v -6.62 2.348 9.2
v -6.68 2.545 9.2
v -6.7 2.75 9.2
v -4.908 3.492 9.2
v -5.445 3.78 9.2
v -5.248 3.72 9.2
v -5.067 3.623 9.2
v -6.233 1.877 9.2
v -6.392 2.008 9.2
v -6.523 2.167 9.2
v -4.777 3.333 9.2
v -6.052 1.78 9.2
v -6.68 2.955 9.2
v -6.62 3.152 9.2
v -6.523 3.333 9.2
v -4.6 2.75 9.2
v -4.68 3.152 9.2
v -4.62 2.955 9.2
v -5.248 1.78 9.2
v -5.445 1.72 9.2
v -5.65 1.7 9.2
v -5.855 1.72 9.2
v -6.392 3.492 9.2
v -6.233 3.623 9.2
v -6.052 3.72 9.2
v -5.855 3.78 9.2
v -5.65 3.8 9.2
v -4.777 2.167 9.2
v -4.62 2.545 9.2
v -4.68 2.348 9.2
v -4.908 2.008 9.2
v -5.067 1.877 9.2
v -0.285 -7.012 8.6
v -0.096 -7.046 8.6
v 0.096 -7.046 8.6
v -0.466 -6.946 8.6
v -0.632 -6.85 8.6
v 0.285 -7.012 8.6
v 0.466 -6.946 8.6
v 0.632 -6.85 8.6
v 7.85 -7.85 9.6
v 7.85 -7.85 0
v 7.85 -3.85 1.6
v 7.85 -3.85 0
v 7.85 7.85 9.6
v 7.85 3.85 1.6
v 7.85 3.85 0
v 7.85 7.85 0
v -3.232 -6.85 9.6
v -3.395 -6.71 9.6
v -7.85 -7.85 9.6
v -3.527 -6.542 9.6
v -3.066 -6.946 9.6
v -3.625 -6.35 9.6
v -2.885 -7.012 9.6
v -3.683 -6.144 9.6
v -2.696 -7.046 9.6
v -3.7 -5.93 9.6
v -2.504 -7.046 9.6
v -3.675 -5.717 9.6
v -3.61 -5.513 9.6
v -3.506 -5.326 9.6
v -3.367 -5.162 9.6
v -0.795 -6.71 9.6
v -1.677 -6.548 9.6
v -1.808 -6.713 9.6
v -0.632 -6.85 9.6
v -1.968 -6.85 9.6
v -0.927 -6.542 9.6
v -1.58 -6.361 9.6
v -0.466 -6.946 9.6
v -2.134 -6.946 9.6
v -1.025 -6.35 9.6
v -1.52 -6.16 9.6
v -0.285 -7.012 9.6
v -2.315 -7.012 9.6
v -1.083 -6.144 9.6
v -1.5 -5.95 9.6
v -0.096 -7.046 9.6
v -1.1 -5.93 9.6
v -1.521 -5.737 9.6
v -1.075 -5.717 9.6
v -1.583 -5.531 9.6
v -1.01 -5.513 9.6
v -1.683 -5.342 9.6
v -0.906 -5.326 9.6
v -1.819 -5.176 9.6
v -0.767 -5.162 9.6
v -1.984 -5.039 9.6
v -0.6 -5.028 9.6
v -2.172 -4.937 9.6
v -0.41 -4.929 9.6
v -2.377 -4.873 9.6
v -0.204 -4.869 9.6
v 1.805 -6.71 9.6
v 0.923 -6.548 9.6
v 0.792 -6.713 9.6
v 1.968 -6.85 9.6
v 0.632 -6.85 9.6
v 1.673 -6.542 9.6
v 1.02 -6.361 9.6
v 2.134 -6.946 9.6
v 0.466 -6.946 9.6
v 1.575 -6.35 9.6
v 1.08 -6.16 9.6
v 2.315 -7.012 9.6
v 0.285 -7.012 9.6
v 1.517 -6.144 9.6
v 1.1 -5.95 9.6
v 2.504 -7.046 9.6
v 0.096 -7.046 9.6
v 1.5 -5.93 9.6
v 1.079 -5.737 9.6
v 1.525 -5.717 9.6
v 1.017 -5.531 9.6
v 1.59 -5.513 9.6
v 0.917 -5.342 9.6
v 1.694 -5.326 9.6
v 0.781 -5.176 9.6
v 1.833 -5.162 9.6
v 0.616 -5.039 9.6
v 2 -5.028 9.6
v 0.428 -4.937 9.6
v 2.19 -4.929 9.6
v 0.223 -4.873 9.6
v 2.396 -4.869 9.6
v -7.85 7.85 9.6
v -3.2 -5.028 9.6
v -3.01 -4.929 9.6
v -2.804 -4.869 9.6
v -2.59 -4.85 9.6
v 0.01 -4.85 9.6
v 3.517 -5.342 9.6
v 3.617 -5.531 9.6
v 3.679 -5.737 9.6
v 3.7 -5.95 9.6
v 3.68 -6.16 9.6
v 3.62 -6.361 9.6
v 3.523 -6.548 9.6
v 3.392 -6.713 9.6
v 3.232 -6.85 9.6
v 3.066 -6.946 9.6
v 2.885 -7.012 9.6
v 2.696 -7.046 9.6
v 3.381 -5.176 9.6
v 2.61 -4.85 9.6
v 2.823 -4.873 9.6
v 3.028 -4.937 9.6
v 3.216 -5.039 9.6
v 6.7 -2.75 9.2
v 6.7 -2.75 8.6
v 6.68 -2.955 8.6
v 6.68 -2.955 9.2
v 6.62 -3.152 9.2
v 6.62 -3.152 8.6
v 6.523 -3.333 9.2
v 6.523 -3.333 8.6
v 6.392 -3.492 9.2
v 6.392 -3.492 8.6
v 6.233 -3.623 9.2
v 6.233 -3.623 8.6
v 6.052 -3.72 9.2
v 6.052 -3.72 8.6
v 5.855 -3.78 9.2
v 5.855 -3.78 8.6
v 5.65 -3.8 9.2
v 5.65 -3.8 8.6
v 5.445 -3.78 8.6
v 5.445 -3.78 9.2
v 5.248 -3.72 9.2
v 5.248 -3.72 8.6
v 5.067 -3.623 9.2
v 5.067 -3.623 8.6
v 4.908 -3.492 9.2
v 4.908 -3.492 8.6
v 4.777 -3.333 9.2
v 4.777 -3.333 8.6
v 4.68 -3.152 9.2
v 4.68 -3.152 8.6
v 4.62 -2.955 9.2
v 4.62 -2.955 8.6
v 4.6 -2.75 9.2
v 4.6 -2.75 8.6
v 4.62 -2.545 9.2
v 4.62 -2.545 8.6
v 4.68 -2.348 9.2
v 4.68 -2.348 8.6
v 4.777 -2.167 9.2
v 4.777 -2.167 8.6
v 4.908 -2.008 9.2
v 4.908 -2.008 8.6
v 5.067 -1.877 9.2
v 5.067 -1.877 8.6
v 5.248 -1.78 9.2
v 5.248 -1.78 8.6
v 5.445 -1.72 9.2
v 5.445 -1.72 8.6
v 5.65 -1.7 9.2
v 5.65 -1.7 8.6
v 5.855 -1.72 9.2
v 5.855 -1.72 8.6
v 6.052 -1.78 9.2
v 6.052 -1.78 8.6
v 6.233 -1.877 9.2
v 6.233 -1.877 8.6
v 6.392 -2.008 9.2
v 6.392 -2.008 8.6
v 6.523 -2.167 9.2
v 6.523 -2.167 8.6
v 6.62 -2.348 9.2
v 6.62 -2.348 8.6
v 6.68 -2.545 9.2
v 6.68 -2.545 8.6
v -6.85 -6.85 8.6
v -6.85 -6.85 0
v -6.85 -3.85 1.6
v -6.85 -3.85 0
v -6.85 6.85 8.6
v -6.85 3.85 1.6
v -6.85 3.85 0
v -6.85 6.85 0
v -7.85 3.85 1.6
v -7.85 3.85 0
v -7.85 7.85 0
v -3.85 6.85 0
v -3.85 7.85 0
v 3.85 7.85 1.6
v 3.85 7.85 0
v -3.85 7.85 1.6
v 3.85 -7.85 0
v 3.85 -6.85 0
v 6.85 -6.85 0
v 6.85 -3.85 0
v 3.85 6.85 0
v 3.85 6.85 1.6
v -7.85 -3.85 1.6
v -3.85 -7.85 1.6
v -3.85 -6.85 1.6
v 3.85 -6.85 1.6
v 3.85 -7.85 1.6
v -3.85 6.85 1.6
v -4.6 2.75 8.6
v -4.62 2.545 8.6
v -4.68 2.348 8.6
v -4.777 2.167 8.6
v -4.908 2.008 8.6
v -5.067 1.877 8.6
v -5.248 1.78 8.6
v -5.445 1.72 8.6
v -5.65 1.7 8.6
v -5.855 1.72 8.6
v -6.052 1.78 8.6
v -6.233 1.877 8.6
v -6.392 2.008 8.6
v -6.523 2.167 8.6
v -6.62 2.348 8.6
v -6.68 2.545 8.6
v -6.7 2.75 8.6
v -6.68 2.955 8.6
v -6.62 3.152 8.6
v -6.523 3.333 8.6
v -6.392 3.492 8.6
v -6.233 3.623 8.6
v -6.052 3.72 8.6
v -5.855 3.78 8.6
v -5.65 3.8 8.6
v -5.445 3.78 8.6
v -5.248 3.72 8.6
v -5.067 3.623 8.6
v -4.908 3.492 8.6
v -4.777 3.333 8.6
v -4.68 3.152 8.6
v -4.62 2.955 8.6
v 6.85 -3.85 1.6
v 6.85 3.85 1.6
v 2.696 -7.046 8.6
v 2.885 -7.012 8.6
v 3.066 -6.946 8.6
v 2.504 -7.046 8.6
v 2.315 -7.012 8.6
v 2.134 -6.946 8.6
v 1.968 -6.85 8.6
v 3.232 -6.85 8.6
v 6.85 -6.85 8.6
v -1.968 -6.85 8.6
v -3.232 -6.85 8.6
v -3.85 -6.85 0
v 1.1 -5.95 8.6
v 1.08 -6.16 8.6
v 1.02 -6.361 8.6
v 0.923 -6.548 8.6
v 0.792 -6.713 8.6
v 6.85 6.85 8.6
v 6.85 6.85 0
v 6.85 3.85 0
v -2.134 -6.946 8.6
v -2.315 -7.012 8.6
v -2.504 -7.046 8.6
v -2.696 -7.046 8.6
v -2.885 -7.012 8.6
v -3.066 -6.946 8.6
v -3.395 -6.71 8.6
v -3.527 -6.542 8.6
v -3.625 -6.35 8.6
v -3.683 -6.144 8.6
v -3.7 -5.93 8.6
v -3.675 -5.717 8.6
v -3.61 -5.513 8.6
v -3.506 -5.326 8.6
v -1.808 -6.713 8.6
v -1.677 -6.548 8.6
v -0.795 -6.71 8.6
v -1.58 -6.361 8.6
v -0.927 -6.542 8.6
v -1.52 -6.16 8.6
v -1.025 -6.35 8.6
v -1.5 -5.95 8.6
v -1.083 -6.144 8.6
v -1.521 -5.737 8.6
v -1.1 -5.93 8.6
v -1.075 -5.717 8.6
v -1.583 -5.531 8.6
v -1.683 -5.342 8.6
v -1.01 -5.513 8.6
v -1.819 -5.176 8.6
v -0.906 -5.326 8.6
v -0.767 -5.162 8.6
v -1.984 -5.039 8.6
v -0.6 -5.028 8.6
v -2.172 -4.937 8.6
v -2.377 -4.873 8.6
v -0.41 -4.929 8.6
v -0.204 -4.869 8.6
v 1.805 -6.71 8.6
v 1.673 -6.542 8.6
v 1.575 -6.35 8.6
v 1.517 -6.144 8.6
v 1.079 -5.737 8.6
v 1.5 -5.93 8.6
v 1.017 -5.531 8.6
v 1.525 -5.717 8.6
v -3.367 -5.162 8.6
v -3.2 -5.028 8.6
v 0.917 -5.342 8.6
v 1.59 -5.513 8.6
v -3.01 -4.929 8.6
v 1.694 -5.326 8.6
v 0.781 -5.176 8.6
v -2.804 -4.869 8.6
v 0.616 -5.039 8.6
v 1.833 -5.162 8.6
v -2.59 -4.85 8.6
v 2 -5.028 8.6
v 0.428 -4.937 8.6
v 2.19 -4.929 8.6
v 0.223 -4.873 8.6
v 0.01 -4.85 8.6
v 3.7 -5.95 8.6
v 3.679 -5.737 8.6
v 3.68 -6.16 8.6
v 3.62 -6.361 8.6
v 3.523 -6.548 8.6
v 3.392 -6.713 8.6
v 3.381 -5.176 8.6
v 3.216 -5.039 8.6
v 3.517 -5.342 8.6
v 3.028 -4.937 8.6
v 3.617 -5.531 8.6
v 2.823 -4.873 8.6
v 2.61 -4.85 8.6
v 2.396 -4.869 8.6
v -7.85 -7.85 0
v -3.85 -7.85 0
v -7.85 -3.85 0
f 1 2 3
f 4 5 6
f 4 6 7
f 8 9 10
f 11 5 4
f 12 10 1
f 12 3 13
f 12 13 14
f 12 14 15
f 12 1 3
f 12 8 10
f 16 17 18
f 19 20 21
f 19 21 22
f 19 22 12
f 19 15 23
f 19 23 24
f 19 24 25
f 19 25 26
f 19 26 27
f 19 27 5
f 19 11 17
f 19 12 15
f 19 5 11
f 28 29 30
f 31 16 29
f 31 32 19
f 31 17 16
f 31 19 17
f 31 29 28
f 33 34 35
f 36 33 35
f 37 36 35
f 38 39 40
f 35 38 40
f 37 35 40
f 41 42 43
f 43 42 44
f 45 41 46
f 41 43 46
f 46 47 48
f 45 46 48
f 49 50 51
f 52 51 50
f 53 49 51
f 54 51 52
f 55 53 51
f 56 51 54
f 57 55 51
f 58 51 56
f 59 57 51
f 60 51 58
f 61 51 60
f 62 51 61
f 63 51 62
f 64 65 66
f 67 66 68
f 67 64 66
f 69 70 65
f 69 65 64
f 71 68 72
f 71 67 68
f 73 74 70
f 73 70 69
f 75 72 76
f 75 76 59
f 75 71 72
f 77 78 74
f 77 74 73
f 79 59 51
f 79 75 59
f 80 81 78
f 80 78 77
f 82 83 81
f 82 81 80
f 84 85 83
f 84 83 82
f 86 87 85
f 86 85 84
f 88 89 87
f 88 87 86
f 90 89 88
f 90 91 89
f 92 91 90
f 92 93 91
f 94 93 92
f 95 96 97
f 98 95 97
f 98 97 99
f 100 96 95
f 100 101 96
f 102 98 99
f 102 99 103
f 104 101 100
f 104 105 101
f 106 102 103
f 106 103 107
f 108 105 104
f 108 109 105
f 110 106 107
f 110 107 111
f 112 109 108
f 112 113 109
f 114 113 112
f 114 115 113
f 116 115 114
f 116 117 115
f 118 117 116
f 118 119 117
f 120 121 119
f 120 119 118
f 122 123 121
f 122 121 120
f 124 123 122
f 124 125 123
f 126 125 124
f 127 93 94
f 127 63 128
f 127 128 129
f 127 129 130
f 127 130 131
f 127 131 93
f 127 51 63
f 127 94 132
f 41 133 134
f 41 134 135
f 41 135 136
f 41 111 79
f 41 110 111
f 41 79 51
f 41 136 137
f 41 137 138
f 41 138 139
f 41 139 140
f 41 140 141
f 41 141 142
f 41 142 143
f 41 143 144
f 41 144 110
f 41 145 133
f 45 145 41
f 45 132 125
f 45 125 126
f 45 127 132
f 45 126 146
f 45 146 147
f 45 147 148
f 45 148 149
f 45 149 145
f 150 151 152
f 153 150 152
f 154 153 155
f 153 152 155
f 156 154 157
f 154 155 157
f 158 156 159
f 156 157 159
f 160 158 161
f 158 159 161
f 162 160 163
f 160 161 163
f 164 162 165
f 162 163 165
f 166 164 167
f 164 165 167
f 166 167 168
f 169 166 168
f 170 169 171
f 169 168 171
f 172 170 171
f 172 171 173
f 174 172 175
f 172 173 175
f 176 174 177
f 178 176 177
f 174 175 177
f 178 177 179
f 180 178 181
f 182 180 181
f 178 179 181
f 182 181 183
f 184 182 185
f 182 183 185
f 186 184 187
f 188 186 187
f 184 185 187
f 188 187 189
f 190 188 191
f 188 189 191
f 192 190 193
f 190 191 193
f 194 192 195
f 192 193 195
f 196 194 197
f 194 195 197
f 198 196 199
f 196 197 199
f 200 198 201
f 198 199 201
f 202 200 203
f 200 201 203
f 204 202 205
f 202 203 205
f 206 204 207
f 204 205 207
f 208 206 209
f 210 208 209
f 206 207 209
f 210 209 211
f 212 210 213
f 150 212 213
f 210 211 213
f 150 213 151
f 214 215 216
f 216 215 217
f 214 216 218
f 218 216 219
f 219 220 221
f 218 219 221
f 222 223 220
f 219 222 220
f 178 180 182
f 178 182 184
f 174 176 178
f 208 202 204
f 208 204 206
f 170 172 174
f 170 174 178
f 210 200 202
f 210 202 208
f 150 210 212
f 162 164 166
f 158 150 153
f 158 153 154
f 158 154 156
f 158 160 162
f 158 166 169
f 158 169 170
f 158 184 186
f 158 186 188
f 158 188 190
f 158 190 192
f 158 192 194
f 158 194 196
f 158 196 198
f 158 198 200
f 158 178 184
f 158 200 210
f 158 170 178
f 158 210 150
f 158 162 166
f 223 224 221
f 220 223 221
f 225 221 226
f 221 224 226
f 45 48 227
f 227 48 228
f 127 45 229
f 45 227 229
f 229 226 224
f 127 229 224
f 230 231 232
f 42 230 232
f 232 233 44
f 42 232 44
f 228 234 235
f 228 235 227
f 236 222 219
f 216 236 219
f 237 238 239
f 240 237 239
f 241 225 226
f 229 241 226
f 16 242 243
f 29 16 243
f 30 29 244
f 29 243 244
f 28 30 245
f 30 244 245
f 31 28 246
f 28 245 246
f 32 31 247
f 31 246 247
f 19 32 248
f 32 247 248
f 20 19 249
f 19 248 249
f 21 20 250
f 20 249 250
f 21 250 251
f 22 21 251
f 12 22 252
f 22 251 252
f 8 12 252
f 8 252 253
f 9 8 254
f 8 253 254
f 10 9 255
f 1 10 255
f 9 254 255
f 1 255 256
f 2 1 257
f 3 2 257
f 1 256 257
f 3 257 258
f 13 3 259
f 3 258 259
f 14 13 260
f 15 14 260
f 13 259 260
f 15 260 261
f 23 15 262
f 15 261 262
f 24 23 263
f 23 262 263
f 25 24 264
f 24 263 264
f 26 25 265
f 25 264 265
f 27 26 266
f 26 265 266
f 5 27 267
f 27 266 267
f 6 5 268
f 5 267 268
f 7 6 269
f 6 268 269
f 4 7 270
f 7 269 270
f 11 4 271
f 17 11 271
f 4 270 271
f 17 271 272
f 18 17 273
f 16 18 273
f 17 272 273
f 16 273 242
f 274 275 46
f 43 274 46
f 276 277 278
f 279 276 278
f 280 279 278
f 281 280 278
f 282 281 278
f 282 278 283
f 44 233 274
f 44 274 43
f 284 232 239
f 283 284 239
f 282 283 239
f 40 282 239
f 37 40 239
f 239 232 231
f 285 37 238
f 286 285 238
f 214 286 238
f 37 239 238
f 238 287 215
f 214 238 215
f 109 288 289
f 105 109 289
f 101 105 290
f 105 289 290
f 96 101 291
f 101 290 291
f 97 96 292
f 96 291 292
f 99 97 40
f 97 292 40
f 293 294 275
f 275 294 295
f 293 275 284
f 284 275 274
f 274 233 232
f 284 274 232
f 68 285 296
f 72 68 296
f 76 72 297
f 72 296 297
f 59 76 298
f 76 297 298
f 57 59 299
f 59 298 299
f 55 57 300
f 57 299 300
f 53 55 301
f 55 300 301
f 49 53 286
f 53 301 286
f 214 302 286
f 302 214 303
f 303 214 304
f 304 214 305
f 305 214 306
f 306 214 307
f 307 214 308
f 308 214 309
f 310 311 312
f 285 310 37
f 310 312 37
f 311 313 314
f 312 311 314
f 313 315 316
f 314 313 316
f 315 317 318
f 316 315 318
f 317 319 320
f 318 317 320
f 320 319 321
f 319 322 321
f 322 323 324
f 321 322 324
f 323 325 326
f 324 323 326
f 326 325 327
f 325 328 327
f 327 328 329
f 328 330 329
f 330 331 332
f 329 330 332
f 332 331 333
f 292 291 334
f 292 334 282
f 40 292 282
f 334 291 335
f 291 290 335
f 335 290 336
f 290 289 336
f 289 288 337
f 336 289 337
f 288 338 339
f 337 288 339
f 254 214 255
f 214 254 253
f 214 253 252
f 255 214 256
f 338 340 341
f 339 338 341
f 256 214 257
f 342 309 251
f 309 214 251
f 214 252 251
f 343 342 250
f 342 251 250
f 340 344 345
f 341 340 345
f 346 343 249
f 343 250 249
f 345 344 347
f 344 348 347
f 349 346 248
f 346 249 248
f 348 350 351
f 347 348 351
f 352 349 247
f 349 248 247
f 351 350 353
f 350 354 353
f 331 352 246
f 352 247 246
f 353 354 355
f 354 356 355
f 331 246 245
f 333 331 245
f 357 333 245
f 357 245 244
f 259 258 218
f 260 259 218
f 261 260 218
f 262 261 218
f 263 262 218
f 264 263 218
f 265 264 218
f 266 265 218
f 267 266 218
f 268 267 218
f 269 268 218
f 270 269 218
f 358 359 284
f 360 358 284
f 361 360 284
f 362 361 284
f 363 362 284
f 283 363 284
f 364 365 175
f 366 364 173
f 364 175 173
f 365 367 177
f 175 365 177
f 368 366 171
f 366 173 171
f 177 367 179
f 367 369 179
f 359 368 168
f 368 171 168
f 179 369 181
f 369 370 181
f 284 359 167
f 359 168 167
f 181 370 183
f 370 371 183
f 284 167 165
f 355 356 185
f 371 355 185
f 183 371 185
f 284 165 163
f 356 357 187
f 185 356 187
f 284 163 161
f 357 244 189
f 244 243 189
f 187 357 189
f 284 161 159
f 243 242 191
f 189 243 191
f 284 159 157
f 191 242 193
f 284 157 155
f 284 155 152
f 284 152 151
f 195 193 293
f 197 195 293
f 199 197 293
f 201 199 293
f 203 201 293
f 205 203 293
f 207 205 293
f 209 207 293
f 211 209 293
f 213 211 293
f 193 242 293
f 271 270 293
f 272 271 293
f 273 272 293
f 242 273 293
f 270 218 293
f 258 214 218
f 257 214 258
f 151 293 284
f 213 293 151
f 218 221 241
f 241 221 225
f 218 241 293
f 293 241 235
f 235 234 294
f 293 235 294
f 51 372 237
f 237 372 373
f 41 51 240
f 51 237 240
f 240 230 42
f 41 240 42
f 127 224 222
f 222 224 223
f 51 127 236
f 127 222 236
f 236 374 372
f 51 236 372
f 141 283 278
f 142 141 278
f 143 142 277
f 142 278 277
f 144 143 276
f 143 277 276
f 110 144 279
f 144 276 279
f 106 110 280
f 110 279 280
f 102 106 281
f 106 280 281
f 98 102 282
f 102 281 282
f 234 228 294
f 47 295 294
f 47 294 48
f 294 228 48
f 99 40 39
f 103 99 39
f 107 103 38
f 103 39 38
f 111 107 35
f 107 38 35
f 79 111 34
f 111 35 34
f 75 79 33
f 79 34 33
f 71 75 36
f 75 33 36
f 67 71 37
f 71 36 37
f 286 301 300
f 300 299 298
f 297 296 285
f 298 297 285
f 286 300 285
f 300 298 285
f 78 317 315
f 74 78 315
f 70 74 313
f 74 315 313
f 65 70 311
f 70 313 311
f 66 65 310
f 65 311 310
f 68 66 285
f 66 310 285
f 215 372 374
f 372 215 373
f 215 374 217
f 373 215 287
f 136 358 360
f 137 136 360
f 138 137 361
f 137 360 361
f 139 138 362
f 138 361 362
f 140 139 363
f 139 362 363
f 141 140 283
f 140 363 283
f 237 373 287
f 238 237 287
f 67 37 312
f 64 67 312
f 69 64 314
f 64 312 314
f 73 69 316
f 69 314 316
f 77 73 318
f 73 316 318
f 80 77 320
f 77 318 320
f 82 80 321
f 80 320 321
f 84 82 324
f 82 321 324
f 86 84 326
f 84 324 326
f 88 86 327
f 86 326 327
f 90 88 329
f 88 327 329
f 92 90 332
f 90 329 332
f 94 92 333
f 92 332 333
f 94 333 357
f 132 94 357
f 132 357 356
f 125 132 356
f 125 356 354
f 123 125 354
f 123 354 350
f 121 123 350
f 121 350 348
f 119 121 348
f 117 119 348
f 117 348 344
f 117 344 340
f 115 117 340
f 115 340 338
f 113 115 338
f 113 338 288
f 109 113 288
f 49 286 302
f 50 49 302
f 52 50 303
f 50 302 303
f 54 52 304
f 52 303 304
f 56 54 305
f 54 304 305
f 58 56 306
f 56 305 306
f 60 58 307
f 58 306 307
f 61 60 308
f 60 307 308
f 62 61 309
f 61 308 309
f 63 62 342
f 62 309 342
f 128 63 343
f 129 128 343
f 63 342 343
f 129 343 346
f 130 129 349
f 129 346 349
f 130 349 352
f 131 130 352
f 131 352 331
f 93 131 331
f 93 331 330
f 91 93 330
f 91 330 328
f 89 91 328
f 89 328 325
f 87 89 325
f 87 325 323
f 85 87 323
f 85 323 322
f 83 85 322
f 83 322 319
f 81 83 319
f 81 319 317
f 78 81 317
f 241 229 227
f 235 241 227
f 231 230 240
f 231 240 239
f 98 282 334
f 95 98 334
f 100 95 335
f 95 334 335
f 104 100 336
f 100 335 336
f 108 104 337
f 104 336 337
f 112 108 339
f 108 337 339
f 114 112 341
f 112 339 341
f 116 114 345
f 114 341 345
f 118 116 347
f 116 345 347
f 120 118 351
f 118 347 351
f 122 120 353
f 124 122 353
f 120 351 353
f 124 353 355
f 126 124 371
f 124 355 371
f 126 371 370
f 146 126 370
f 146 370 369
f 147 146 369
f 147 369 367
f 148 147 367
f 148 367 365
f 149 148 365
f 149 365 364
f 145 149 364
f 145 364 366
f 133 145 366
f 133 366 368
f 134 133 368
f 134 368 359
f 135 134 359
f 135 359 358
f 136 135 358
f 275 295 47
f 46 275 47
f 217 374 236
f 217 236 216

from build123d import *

# Parameters (mm, degrees)
F0_W     = 7.7
F0_H     = 1
F0_W_2   = 1
F0_H_2   = 7.7
F1_DEPTH = 9.6
F2_DEPTH = 1.6
F3_START = 8.6
F3_DEPTH = 1
F4_R     = 1.05
F5_DEPTH = 0.6
F6_DEPTH = 1.001


with BuildPart() as f1:
    # F0 (on Top) → F1 (new body)
    with BuildSketch(Plane.XY):
        Polygon((-3.85, 7.85), (-7.85, 7.85), (-7.85, 3.85), (-6.85, 3.85), (-6.85, 6.85), (-3.85, 6.85), align=None)
        with Locations((0, 7.35)):
            Rectangle(F0_W, F0_H)
        with Locations((-7.35, 0)):
            Rectangle(F0_W_2, F0_H_2)
        Polygon((7.85, 7.85), (3.85, 7.85), (3.85, 6.85), (6.85, 6.85), (6.85, 3.85), (7.85, 3.85), align=None)
        Polygon((-6.85, -3.85), (-7.85, -3.85), (-7.85, -7.85), (-3.85, -7.85), (-3.85, -6.85), (-6.85, -6.85), align=None)
        with Locations((7.35, 0)):
            Rectangle(F0_W_2, F0_H_2)
        with Locations((0, -7.35)):
            Rectangle(F0_W, F0_H)
        Polygon((7.85, -7.85), (7.85, -3.85), (6.85, -3.85), (6.85, -6.85), (3.85, -6.85), (3.85, -7.85), align=None)
    extrude(amount=F1_DEPTH)

    # F0 (on Top) → F2 (cut)
    with BuildSketch(Plane.XY):
        with Locations((0, 7.35)):
            Rectangle(F0_W, F0_H)
        with Locations((7.35, 0)):
            Rectangle(F0_W_2, F0_H_2)
        with Locations((0, -7.35)):
            Rectangle(F0_W, F0_H)
        with Locations((-7.35, 0)):
            Rectangle(F0_W_2, F0_H_2)
    extrude(amount=F2_DEPTH, mode=Mode.SUBTRACT)

    # F0 (on Top) → F3 (join)
    with BuildSketch(Plane.XY.offset(F3_START)):
        Polygon((3.85, 6.85), (-3.85, 6.85), (-6.85, 6.85), (-6.85, 3.85), (-6.85, -3.85), (-6.85, -6.85), (-3.85, -6.85), (3.85, -6.85), (6.85, -6.85), (6.85, -3.85), (6.85, 3.85), (6.85, 6.85), align=None)
    extrude(amount=F3_DEPTH)

    # F4 (on face) → F5 (cut)
    with BuildSketch(Plane(origin=(0, 0, 8.6), x_dir=(1, 0, 0), z_dir=(0, 0, -1))):
        with Locations((-5.65, -2.75)):
            Circle(F4_R)
        with Locations((5.65, 2.75)):
            Circle(F4_R)
    extrude(amount=-F5_DEPTH, mode=Mode.SUBTRACT)

    # F4 (on face) → F6 (cut, through all)
    with BuildSketch(Plane(origin=(0, 0, 8.6), x_dir=(1, 0, 0), z_dir=(0, 0, -1))):
        with BuildLine():
            Line((-3.232455532, 6.85), (-1.967544468, 6.85))
            ThreePointArc((-1.967544468, 6.85), (-2.6, 7.05), (-3.232455532, 6.85))
        make_face()
        with BuildLine():
            ThreePointArc((-3.232455532, 6.85), (-3.1070990607, 4.9738593633), (-1.5, 5.95))
            ThreePointArc((-1.5, 5.95), (-1.6238593633, 6.4570990607), (-1.967544468, 6.85))
            Line((-1.967544468, 6.85), (-3.232455532, 6.85))
        make_face()
        with BuildLine():
            ThreePointArc((0.632455532, 6.85), (0, 7.05), (-0.632455532, 6.85))
            Line((-0.632455532, 6.85), (0.632455532, 6.85))
        make_face()
        with BuildLine():
            Line((0.632455532, 6.85), (-0.632455532, 6.85))
            ThreePointArc((-0.632455532, 6.85), (-0.5070990607, 4.9738593633), (1.1, 5.95))
            ThreePointArc((1.1, 5.95), (0.9761406367, 6.4570990607), (0.632455532, 6.85))
        make_face()
        with BuildLine():
            ThreePointArc((3.232455532, 6.85), (2.6, 7.05), (1.967544468, 6.85))
            Line((1.967544468, 6.85), (3.232455532, 6.85))
        make_face()
        with BuildLine():
            Line((3.232455532, 6.85), (1.967544468, 6.85))
            ThreePointArc((1.967544468, 6.85), (2.0929009393, 4.9738593633), (3.7, 5.95))
            ThreePointArc((3.7, 5.95), (3.5761406367, 6.4570990607), (3.232455532, 6.85))
        make_face()
    extrude(amount=-F6_DEPTH, mode=Mode.SUBTRACT)


solid = f1.part
